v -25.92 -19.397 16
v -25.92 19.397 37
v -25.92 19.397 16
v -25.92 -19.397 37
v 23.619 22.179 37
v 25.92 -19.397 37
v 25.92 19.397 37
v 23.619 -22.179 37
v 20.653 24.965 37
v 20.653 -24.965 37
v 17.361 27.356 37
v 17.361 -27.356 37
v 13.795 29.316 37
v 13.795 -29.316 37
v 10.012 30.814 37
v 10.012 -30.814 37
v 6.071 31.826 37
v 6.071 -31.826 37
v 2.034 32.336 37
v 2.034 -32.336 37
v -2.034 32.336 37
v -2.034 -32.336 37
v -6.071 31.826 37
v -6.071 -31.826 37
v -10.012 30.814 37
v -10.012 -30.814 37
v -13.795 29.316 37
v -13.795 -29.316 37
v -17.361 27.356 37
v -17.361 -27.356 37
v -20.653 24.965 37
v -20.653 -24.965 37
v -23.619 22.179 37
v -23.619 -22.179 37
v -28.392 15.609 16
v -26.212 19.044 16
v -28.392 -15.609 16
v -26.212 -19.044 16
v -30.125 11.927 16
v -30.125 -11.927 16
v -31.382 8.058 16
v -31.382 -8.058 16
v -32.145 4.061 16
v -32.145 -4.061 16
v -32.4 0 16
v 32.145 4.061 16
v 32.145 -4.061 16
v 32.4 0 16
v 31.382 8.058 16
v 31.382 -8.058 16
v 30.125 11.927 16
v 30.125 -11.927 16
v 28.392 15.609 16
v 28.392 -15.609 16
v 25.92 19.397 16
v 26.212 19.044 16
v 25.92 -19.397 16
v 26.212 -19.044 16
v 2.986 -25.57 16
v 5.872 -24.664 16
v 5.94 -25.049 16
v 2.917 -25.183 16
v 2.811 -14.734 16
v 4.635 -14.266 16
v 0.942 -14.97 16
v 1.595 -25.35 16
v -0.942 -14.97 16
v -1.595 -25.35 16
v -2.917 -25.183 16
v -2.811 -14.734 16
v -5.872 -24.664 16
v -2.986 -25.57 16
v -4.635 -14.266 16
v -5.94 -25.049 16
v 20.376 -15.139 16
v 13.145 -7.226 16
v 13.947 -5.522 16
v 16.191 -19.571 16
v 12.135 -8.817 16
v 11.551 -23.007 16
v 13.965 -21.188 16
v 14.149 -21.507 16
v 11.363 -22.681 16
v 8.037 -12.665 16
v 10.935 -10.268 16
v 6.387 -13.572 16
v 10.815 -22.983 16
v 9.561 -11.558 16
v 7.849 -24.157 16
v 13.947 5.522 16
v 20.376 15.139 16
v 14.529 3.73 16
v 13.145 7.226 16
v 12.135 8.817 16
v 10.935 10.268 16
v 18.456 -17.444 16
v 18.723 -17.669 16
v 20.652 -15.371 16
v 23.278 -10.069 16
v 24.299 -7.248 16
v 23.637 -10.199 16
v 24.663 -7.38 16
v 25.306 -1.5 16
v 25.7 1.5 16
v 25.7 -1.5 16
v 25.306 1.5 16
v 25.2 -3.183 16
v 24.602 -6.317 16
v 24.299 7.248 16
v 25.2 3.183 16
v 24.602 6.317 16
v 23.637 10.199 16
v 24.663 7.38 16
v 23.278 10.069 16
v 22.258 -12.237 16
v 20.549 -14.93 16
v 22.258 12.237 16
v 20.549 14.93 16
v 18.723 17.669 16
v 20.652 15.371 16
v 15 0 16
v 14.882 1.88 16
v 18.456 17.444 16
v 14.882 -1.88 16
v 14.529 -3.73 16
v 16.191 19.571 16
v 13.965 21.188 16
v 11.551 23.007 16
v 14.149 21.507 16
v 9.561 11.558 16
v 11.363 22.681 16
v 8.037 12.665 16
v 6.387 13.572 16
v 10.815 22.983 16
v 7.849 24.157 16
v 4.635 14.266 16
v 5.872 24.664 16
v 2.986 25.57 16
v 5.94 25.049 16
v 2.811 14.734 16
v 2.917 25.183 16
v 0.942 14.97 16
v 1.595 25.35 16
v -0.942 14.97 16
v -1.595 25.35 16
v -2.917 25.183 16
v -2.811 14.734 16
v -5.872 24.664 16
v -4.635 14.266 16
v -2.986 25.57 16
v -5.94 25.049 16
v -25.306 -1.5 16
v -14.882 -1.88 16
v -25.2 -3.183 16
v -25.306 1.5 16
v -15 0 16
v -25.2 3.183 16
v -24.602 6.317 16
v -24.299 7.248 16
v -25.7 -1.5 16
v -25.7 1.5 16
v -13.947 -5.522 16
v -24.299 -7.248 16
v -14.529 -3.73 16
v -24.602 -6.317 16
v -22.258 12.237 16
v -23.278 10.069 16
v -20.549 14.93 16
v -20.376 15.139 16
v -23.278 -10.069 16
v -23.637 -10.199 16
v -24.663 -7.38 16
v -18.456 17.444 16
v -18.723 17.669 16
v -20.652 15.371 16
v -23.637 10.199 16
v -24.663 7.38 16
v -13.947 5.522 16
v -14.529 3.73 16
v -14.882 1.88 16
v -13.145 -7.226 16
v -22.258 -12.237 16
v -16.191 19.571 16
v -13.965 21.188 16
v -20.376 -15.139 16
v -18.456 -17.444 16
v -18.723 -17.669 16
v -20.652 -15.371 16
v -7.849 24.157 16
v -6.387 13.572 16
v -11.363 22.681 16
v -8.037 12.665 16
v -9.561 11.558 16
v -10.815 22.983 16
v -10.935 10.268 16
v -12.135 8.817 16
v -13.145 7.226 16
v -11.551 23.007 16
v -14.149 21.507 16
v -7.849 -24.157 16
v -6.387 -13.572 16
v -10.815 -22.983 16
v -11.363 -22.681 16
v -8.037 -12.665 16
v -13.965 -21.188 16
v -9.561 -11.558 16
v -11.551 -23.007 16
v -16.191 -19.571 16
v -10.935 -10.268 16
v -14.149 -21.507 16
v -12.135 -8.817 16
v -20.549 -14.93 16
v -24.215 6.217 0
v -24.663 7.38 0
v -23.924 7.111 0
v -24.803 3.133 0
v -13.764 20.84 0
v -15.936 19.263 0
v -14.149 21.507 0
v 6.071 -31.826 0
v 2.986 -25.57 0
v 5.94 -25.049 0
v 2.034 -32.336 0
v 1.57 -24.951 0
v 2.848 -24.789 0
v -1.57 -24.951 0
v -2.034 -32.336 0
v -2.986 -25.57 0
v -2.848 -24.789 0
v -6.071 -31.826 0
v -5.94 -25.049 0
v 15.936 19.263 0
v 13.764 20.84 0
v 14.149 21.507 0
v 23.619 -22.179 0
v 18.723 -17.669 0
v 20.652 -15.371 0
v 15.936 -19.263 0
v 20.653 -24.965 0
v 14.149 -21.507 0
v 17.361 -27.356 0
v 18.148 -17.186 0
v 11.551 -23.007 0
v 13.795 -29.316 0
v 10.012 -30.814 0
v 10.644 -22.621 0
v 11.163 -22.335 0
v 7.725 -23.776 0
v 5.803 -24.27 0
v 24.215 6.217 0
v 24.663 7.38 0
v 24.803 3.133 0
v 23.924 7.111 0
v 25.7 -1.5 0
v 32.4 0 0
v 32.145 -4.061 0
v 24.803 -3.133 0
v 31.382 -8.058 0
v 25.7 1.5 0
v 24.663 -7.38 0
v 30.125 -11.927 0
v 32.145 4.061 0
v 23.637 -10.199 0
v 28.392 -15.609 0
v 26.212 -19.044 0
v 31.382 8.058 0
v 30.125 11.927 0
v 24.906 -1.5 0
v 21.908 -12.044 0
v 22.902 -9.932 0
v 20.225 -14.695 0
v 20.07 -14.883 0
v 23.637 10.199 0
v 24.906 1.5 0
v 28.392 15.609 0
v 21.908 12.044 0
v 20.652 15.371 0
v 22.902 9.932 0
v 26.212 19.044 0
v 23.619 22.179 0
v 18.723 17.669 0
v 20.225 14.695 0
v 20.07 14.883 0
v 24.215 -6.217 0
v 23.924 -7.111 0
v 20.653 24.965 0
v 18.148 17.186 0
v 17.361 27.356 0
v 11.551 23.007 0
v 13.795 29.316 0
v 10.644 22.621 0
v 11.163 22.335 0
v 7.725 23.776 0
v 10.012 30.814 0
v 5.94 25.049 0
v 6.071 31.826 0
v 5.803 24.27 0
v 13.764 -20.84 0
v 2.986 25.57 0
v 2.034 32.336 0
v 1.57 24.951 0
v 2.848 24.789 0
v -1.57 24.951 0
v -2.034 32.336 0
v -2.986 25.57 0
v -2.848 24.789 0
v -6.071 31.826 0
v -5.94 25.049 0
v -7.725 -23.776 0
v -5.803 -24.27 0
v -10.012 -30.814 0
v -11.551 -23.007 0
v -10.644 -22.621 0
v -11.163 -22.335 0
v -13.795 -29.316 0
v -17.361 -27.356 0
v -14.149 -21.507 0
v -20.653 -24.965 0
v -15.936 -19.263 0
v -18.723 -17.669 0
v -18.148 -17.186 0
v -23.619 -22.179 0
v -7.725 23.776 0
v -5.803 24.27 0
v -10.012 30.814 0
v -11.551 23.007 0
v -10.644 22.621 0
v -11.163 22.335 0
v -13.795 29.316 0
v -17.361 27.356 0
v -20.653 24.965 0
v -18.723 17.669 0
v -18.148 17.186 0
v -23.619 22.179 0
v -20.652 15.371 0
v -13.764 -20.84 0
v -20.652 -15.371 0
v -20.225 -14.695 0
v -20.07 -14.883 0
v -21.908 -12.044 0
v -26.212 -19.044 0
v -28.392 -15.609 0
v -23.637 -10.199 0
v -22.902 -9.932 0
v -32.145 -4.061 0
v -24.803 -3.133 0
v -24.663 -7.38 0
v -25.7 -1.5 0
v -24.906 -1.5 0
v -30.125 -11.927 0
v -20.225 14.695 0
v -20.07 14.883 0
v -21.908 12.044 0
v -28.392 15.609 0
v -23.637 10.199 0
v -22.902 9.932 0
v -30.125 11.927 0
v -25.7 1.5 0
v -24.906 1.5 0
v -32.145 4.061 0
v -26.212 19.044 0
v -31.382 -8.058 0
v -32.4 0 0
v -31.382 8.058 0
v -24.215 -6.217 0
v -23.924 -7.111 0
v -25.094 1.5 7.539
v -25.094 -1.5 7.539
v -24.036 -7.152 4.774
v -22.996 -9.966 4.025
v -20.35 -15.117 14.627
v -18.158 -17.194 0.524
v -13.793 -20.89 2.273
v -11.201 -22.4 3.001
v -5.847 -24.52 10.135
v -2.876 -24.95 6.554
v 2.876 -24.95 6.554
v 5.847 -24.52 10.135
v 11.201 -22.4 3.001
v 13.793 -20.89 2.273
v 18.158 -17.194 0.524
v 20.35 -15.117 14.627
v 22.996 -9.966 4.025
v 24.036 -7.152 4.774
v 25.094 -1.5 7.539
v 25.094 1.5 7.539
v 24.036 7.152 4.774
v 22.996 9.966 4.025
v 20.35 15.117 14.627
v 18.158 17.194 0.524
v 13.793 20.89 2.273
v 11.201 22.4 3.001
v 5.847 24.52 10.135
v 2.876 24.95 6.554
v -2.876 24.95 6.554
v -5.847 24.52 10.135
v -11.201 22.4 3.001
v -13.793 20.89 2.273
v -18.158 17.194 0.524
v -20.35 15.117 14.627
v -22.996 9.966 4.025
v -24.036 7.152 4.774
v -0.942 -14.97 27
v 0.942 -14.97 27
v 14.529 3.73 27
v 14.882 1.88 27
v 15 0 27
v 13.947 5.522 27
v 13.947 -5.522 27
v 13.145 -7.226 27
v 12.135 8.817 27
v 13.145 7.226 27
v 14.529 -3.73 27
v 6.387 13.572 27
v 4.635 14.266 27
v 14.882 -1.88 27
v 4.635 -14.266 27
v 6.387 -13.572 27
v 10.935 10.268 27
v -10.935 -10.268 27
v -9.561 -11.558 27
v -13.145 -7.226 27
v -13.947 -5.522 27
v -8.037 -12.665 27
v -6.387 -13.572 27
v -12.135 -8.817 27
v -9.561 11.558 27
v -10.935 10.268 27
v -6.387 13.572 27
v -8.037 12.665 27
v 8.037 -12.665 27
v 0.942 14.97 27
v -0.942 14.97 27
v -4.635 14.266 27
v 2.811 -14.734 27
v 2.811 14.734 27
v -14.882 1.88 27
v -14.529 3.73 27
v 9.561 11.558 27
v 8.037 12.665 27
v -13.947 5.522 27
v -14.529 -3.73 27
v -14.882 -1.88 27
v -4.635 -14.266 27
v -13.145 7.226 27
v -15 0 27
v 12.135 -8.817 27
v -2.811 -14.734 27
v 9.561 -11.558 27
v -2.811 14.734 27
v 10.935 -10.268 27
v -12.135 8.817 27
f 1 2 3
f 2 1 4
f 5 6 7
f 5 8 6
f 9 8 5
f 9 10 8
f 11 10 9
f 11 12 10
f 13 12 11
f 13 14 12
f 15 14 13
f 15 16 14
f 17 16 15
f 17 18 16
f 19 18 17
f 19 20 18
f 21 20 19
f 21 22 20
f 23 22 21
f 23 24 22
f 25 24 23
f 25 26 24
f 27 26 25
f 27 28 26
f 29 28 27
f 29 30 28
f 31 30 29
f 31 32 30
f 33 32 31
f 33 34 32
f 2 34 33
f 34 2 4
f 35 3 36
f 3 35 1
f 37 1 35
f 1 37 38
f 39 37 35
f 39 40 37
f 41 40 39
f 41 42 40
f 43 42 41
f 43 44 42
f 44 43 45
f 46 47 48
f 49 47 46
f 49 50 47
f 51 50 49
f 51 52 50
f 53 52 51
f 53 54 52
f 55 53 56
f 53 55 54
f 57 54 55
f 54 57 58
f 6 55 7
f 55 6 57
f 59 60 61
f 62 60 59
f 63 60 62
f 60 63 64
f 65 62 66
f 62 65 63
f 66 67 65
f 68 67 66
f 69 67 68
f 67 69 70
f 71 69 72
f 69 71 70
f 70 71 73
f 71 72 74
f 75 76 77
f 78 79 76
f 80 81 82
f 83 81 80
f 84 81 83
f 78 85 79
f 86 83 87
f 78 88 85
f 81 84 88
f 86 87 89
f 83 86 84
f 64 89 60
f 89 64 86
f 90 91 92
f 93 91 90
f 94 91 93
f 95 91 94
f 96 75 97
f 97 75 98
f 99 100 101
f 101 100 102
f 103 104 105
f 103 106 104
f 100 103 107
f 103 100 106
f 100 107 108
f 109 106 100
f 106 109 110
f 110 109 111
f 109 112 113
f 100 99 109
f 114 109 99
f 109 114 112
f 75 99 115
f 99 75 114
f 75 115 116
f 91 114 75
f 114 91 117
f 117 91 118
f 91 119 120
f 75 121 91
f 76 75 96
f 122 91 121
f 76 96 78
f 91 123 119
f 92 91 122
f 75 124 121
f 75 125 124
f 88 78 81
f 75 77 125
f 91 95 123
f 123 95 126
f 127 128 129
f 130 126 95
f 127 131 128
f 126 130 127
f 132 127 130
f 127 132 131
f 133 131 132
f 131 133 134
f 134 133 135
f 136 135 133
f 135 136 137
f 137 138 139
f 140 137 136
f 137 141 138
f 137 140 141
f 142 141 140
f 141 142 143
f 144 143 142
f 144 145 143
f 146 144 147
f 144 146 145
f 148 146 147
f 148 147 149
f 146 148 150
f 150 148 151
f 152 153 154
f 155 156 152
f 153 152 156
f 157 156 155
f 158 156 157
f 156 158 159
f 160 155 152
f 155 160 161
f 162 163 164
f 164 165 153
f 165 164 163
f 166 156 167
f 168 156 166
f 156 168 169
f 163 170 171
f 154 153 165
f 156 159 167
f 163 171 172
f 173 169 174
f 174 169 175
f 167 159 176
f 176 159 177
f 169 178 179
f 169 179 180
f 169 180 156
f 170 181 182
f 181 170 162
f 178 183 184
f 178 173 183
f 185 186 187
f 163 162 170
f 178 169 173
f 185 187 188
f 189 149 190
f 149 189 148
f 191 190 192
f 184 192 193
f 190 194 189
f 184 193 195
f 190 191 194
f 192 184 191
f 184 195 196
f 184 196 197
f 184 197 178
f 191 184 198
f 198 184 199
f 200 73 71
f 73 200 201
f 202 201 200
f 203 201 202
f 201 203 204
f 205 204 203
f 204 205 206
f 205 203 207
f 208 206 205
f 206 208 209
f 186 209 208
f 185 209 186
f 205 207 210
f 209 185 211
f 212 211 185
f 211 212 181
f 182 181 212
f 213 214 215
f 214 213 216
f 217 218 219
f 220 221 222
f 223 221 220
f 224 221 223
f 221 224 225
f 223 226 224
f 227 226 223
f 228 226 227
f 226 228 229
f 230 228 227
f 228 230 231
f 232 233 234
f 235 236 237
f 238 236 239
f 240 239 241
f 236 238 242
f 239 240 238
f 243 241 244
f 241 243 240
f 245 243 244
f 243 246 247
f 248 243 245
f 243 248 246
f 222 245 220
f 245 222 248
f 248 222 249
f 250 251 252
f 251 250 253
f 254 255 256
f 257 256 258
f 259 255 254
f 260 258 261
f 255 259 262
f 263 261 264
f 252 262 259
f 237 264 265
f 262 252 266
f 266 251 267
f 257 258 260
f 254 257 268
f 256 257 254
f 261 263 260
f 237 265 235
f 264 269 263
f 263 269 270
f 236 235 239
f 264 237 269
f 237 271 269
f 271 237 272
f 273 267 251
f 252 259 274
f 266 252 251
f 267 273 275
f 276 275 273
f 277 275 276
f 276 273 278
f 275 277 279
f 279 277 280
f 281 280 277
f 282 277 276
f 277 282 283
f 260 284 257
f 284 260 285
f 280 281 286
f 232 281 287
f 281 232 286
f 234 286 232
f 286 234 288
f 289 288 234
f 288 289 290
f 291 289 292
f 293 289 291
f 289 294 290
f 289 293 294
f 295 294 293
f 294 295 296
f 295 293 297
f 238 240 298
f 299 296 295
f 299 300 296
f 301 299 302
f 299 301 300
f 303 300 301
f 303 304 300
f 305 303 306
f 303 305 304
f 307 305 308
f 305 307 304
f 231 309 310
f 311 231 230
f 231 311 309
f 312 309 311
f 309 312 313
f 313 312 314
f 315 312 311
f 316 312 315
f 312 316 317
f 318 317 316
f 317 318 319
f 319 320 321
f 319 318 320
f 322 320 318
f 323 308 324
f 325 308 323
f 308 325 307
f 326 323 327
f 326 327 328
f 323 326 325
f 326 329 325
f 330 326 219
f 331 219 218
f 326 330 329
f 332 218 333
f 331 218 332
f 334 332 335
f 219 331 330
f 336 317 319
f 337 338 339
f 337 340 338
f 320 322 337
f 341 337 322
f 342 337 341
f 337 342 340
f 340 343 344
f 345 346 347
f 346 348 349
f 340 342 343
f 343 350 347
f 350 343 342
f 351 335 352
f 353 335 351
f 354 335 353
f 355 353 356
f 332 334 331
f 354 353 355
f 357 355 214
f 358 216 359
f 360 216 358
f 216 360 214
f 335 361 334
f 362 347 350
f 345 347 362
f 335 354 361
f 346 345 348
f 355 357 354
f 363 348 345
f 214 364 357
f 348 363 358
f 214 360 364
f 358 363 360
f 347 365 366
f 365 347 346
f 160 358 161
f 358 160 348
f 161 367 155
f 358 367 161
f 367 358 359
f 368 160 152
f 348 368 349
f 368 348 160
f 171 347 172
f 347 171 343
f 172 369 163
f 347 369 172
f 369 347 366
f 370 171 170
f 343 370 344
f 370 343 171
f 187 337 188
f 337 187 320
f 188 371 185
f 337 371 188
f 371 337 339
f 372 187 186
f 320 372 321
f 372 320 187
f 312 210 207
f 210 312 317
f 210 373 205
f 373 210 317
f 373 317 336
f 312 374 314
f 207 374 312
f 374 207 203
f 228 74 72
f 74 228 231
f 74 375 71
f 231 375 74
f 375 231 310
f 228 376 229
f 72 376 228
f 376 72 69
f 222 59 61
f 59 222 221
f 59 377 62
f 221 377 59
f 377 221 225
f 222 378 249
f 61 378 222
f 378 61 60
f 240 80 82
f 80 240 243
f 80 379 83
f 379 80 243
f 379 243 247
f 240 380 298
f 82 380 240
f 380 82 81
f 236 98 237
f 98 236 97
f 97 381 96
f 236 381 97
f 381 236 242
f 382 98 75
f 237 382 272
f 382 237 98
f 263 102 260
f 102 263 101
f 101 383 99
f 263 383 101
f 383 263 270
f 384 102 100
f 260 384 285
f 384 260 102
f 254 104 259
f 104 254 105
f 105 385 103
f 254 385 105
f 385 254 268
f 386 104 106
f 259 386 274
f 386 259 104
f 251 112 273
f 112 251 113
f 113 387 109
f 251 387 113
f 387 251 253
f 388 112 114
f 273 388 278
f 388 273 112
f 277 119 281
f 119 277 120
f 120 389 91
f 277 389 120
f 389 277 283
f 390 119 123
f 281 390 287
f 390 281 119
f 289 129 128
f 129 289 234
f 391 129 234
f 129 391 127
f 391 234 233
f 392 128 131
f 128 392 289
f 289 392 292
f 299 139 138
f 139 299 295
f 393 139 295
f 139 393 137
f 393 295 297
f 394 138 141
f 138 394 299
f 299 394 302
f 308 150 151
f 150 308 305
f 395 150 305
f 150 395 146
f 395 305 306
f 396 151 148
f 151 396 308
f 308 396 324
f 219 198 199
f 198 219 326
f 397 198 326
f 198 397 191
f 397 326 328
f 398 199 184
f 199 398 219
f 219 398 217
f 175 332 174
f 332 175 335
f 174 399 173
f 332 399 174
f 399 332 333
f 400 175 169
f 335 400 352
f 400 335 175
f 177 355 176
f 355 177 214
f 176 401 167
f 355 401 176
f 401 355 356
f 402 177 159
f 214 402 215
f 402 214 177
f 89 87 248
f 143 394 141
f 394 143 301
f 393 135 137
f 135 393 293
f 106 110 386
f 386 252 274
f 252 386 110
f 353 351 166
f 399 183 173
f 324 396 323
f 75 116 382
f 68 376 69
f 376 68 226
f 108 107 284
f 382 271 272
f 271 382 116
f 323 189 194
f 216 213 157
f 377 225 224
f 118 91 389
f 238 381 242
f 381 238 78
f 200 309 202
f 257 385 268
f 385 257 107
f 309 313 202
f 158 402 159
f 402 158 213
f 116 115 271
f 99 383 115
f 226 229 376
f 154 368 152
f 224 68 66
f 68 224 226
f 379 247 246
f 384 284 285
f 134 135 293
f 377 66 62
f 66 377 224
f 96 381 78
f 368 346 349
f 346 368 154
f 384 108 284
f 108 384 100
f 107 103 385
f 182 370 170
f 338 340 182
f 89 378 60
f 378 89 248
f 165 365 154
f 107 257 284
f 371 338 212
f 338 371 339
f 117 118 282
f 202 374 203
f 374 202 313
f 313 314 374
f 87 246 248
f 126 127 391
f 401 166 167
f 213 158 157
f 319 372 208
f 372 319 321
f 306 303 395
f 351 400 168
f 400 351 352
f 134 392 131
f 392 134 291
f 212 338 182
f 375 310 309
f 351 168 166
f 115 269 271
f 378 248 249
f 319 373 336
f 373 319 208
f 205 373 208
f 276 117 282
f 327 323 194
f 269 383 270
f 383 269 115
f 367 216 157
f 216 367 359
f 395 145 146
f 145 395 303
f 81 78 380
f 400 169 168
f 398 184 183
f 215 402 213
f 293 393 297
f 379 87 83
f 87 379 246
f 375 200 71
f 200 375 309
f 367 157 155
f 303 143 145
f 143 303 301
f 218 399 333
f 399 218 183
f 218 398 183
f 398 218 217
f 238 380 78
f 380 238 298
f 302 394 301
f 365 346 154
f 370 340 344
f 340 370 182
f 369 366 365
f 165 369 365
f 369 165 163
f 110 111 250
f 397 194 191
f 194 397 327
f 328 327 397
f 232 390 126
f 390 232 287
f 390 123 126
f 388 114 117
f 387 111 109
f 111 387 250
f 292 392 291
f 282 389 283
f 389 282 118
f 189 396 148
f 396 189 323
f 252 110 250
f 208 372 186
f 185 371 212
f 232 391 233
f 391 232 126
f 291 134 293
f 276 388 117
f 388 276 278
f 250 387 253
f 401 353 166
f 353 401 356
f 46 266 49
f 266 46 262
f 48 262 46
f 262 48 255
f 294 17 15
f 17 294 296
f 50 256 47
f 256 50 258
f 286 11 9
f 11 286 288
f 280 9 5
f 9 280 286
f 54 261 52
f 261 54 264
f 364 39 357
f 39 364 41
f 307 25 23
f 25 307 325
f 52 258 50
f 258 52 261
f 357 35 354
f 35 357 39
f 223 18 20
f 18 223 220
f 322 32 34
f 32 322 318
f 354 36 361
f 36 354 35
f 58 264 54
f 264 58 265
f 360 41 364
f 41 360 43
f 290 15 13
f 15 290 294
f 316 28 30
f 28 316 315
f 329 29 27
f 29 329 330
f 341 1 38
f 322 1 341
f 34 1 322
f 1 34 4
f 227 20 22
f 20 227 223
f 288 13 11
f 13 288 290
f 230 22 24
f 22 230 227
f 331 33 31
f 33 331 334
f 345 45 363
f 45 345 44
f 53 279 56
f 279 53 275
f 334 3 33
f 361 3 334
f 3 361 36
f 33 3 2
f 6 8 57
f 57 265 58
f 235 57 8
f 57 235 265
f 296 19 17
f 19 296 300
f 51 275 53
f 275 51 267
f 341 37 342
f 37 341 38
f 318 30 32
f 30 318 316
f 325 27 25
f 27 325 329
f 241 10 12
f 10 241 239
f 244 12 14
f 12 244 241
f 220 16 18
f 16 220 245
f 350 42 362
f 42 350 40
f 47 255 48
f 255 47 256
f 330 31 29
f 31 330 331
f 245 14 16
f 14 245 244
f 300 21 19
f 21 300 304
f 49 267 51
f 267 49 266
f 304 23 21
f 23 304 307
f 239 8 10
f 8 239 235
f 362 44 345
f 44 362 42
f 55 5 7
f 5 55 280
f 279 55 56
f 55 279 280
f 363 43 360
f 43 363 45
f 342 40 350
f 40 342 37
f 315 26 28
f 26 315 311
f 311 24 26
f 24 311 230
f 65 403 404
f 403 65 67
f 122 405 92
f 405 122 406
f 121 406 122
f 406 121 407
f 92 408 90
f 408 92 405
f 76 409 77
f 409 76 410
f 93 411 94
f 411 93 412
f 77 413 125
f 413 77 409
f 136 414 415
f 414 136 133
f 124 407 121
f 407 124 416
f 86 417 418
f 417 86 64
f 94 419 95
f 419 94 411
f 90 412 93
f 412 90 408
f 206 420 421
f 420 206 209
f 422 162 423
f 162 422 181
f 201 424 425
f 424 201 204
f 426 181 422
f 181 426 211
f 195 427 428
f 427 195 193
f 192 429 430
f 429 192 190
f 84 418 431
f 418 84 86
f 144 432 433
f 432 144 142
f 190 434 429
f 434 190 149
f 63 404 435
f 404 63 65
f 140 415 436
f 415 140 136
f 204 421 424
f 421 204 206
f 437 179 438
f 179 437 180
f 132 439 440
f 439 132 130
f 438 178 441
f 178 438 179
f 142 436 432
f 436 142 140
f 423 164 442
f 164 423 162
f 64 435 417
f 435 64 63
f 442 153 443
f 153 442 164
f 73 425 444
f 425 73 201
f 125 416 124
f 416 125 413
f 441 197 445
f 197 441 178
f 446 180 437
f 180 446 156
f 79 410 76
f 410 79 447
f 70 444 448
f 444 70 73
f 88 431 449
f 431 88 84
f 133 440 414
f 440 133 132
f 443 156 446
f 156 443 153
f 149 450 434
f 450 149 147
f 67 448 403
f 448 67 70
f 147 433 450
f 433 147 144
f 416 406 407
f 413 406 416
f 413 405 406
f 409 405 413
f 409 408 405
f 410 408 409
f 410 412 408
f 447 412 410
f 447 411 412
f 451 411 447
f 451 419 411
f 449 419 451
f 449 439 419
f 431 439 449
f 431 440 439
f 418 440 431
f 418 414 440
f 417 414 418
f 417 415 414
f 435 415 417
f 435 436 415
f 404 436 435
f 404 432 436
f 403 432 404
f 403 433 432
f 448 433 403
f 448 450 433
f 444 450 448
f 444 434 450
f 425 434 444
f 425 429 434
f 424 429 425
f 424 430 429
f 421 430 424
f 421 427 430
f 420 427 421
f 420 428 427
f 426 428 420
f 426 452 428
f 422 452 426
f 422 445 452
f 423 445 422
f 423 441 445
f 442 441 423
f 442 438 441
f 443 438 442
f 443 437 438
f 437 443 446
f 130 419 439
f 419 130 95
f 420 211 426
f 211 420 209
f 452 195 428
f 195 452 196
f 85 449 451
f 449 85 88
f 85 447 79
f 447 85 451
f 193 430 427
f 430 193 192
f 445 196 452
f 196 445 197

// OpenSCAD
SLOT_WIDTH = 3;
SLOT_THICKNESS = 1;
SLOTS = 18;
FLANGE_OUTER_DIA_TOP = 50;
FLANGE_OUTER_DIA_BOT = 50.8;
FLANGE_HEIGHT = 16;
FLANGE_INNER_DIA = 30;
FLANGE_CLEARANCE_HEIGHT = 11;

WALL_THICKNESS = 6;
OUTER_DIA = max([FLANGE_OUTER_DIA_TOP, FLANGE_OUTER_DIA_BOT]) + 2 * SLOT_THICKNESS + 2 * WALL_THICKNESS;

HEIGHT = FLANGE_HEIGHT + FLANGE_CLEARANCE_HEIGHT + 10;
FLAT_AT = 0.90;

$fn = 50;

module flange_neg() {
    union() {
        cylinder(d2 = FLANGE_OUTER_DIA_BOT, d1 = FLANGE_OUTER_DIA_TOP, h = FLANGE_HEIGHT);
        for(i = [0:SLOTS-1]) {
            rotate([0, 0, i * 360/SLOTS])
            translate([-(FLANGE_OUTER_DIA_TOP+FLANGE_OUTER_DIA_BOT)/4, 0, 0])
            translate([-SLOT_THICKNESS/2, -SLOT_WIDTH/2, 0])
            cube(size = [SLOT_THICKNESS, SLOT_WIDTH, FLANGE_HEIGHT]);
        }
    }
}

module flange_clearance_neg() {
    cylinder(d = FLANGE_INNER_DIA, h = FLANGE_CLEARANCE_HEIGHT);
}

module adapter_pos() {
    cylinder(d = OUTER_DIA, h = HEIGHT);
}

module adapter_neg() {
    union() {
        translate([-OUTER_DIA * FLAT_AT, 0, 0])
        translate([-OUTER_DIA/2, -OUTER_DIA/2, 0])
        cube(size = [OUTER_DIA, OUTER_DIA, HEIGHT - FLANGE_HEIGHT]);
        translate([OUTER_DIA * FLAT_AT, 0, 0])
        translate([-OUTER_DIA/2, -OUTER_DIA/2, 0])
        cube(size = [OUTER_DIA, OUTER_DIA, HEIGHT - FLANGE_HEIGHT]);
    }
}

difference() {
    adapter_pos();
    translate([0, 0, FLANGE_HEIGHT])
    adapter_neg();
    flange_neg();
    translate([0, 0, FLANGE_HEIGHT])
    flange_clearance_neg();
}
